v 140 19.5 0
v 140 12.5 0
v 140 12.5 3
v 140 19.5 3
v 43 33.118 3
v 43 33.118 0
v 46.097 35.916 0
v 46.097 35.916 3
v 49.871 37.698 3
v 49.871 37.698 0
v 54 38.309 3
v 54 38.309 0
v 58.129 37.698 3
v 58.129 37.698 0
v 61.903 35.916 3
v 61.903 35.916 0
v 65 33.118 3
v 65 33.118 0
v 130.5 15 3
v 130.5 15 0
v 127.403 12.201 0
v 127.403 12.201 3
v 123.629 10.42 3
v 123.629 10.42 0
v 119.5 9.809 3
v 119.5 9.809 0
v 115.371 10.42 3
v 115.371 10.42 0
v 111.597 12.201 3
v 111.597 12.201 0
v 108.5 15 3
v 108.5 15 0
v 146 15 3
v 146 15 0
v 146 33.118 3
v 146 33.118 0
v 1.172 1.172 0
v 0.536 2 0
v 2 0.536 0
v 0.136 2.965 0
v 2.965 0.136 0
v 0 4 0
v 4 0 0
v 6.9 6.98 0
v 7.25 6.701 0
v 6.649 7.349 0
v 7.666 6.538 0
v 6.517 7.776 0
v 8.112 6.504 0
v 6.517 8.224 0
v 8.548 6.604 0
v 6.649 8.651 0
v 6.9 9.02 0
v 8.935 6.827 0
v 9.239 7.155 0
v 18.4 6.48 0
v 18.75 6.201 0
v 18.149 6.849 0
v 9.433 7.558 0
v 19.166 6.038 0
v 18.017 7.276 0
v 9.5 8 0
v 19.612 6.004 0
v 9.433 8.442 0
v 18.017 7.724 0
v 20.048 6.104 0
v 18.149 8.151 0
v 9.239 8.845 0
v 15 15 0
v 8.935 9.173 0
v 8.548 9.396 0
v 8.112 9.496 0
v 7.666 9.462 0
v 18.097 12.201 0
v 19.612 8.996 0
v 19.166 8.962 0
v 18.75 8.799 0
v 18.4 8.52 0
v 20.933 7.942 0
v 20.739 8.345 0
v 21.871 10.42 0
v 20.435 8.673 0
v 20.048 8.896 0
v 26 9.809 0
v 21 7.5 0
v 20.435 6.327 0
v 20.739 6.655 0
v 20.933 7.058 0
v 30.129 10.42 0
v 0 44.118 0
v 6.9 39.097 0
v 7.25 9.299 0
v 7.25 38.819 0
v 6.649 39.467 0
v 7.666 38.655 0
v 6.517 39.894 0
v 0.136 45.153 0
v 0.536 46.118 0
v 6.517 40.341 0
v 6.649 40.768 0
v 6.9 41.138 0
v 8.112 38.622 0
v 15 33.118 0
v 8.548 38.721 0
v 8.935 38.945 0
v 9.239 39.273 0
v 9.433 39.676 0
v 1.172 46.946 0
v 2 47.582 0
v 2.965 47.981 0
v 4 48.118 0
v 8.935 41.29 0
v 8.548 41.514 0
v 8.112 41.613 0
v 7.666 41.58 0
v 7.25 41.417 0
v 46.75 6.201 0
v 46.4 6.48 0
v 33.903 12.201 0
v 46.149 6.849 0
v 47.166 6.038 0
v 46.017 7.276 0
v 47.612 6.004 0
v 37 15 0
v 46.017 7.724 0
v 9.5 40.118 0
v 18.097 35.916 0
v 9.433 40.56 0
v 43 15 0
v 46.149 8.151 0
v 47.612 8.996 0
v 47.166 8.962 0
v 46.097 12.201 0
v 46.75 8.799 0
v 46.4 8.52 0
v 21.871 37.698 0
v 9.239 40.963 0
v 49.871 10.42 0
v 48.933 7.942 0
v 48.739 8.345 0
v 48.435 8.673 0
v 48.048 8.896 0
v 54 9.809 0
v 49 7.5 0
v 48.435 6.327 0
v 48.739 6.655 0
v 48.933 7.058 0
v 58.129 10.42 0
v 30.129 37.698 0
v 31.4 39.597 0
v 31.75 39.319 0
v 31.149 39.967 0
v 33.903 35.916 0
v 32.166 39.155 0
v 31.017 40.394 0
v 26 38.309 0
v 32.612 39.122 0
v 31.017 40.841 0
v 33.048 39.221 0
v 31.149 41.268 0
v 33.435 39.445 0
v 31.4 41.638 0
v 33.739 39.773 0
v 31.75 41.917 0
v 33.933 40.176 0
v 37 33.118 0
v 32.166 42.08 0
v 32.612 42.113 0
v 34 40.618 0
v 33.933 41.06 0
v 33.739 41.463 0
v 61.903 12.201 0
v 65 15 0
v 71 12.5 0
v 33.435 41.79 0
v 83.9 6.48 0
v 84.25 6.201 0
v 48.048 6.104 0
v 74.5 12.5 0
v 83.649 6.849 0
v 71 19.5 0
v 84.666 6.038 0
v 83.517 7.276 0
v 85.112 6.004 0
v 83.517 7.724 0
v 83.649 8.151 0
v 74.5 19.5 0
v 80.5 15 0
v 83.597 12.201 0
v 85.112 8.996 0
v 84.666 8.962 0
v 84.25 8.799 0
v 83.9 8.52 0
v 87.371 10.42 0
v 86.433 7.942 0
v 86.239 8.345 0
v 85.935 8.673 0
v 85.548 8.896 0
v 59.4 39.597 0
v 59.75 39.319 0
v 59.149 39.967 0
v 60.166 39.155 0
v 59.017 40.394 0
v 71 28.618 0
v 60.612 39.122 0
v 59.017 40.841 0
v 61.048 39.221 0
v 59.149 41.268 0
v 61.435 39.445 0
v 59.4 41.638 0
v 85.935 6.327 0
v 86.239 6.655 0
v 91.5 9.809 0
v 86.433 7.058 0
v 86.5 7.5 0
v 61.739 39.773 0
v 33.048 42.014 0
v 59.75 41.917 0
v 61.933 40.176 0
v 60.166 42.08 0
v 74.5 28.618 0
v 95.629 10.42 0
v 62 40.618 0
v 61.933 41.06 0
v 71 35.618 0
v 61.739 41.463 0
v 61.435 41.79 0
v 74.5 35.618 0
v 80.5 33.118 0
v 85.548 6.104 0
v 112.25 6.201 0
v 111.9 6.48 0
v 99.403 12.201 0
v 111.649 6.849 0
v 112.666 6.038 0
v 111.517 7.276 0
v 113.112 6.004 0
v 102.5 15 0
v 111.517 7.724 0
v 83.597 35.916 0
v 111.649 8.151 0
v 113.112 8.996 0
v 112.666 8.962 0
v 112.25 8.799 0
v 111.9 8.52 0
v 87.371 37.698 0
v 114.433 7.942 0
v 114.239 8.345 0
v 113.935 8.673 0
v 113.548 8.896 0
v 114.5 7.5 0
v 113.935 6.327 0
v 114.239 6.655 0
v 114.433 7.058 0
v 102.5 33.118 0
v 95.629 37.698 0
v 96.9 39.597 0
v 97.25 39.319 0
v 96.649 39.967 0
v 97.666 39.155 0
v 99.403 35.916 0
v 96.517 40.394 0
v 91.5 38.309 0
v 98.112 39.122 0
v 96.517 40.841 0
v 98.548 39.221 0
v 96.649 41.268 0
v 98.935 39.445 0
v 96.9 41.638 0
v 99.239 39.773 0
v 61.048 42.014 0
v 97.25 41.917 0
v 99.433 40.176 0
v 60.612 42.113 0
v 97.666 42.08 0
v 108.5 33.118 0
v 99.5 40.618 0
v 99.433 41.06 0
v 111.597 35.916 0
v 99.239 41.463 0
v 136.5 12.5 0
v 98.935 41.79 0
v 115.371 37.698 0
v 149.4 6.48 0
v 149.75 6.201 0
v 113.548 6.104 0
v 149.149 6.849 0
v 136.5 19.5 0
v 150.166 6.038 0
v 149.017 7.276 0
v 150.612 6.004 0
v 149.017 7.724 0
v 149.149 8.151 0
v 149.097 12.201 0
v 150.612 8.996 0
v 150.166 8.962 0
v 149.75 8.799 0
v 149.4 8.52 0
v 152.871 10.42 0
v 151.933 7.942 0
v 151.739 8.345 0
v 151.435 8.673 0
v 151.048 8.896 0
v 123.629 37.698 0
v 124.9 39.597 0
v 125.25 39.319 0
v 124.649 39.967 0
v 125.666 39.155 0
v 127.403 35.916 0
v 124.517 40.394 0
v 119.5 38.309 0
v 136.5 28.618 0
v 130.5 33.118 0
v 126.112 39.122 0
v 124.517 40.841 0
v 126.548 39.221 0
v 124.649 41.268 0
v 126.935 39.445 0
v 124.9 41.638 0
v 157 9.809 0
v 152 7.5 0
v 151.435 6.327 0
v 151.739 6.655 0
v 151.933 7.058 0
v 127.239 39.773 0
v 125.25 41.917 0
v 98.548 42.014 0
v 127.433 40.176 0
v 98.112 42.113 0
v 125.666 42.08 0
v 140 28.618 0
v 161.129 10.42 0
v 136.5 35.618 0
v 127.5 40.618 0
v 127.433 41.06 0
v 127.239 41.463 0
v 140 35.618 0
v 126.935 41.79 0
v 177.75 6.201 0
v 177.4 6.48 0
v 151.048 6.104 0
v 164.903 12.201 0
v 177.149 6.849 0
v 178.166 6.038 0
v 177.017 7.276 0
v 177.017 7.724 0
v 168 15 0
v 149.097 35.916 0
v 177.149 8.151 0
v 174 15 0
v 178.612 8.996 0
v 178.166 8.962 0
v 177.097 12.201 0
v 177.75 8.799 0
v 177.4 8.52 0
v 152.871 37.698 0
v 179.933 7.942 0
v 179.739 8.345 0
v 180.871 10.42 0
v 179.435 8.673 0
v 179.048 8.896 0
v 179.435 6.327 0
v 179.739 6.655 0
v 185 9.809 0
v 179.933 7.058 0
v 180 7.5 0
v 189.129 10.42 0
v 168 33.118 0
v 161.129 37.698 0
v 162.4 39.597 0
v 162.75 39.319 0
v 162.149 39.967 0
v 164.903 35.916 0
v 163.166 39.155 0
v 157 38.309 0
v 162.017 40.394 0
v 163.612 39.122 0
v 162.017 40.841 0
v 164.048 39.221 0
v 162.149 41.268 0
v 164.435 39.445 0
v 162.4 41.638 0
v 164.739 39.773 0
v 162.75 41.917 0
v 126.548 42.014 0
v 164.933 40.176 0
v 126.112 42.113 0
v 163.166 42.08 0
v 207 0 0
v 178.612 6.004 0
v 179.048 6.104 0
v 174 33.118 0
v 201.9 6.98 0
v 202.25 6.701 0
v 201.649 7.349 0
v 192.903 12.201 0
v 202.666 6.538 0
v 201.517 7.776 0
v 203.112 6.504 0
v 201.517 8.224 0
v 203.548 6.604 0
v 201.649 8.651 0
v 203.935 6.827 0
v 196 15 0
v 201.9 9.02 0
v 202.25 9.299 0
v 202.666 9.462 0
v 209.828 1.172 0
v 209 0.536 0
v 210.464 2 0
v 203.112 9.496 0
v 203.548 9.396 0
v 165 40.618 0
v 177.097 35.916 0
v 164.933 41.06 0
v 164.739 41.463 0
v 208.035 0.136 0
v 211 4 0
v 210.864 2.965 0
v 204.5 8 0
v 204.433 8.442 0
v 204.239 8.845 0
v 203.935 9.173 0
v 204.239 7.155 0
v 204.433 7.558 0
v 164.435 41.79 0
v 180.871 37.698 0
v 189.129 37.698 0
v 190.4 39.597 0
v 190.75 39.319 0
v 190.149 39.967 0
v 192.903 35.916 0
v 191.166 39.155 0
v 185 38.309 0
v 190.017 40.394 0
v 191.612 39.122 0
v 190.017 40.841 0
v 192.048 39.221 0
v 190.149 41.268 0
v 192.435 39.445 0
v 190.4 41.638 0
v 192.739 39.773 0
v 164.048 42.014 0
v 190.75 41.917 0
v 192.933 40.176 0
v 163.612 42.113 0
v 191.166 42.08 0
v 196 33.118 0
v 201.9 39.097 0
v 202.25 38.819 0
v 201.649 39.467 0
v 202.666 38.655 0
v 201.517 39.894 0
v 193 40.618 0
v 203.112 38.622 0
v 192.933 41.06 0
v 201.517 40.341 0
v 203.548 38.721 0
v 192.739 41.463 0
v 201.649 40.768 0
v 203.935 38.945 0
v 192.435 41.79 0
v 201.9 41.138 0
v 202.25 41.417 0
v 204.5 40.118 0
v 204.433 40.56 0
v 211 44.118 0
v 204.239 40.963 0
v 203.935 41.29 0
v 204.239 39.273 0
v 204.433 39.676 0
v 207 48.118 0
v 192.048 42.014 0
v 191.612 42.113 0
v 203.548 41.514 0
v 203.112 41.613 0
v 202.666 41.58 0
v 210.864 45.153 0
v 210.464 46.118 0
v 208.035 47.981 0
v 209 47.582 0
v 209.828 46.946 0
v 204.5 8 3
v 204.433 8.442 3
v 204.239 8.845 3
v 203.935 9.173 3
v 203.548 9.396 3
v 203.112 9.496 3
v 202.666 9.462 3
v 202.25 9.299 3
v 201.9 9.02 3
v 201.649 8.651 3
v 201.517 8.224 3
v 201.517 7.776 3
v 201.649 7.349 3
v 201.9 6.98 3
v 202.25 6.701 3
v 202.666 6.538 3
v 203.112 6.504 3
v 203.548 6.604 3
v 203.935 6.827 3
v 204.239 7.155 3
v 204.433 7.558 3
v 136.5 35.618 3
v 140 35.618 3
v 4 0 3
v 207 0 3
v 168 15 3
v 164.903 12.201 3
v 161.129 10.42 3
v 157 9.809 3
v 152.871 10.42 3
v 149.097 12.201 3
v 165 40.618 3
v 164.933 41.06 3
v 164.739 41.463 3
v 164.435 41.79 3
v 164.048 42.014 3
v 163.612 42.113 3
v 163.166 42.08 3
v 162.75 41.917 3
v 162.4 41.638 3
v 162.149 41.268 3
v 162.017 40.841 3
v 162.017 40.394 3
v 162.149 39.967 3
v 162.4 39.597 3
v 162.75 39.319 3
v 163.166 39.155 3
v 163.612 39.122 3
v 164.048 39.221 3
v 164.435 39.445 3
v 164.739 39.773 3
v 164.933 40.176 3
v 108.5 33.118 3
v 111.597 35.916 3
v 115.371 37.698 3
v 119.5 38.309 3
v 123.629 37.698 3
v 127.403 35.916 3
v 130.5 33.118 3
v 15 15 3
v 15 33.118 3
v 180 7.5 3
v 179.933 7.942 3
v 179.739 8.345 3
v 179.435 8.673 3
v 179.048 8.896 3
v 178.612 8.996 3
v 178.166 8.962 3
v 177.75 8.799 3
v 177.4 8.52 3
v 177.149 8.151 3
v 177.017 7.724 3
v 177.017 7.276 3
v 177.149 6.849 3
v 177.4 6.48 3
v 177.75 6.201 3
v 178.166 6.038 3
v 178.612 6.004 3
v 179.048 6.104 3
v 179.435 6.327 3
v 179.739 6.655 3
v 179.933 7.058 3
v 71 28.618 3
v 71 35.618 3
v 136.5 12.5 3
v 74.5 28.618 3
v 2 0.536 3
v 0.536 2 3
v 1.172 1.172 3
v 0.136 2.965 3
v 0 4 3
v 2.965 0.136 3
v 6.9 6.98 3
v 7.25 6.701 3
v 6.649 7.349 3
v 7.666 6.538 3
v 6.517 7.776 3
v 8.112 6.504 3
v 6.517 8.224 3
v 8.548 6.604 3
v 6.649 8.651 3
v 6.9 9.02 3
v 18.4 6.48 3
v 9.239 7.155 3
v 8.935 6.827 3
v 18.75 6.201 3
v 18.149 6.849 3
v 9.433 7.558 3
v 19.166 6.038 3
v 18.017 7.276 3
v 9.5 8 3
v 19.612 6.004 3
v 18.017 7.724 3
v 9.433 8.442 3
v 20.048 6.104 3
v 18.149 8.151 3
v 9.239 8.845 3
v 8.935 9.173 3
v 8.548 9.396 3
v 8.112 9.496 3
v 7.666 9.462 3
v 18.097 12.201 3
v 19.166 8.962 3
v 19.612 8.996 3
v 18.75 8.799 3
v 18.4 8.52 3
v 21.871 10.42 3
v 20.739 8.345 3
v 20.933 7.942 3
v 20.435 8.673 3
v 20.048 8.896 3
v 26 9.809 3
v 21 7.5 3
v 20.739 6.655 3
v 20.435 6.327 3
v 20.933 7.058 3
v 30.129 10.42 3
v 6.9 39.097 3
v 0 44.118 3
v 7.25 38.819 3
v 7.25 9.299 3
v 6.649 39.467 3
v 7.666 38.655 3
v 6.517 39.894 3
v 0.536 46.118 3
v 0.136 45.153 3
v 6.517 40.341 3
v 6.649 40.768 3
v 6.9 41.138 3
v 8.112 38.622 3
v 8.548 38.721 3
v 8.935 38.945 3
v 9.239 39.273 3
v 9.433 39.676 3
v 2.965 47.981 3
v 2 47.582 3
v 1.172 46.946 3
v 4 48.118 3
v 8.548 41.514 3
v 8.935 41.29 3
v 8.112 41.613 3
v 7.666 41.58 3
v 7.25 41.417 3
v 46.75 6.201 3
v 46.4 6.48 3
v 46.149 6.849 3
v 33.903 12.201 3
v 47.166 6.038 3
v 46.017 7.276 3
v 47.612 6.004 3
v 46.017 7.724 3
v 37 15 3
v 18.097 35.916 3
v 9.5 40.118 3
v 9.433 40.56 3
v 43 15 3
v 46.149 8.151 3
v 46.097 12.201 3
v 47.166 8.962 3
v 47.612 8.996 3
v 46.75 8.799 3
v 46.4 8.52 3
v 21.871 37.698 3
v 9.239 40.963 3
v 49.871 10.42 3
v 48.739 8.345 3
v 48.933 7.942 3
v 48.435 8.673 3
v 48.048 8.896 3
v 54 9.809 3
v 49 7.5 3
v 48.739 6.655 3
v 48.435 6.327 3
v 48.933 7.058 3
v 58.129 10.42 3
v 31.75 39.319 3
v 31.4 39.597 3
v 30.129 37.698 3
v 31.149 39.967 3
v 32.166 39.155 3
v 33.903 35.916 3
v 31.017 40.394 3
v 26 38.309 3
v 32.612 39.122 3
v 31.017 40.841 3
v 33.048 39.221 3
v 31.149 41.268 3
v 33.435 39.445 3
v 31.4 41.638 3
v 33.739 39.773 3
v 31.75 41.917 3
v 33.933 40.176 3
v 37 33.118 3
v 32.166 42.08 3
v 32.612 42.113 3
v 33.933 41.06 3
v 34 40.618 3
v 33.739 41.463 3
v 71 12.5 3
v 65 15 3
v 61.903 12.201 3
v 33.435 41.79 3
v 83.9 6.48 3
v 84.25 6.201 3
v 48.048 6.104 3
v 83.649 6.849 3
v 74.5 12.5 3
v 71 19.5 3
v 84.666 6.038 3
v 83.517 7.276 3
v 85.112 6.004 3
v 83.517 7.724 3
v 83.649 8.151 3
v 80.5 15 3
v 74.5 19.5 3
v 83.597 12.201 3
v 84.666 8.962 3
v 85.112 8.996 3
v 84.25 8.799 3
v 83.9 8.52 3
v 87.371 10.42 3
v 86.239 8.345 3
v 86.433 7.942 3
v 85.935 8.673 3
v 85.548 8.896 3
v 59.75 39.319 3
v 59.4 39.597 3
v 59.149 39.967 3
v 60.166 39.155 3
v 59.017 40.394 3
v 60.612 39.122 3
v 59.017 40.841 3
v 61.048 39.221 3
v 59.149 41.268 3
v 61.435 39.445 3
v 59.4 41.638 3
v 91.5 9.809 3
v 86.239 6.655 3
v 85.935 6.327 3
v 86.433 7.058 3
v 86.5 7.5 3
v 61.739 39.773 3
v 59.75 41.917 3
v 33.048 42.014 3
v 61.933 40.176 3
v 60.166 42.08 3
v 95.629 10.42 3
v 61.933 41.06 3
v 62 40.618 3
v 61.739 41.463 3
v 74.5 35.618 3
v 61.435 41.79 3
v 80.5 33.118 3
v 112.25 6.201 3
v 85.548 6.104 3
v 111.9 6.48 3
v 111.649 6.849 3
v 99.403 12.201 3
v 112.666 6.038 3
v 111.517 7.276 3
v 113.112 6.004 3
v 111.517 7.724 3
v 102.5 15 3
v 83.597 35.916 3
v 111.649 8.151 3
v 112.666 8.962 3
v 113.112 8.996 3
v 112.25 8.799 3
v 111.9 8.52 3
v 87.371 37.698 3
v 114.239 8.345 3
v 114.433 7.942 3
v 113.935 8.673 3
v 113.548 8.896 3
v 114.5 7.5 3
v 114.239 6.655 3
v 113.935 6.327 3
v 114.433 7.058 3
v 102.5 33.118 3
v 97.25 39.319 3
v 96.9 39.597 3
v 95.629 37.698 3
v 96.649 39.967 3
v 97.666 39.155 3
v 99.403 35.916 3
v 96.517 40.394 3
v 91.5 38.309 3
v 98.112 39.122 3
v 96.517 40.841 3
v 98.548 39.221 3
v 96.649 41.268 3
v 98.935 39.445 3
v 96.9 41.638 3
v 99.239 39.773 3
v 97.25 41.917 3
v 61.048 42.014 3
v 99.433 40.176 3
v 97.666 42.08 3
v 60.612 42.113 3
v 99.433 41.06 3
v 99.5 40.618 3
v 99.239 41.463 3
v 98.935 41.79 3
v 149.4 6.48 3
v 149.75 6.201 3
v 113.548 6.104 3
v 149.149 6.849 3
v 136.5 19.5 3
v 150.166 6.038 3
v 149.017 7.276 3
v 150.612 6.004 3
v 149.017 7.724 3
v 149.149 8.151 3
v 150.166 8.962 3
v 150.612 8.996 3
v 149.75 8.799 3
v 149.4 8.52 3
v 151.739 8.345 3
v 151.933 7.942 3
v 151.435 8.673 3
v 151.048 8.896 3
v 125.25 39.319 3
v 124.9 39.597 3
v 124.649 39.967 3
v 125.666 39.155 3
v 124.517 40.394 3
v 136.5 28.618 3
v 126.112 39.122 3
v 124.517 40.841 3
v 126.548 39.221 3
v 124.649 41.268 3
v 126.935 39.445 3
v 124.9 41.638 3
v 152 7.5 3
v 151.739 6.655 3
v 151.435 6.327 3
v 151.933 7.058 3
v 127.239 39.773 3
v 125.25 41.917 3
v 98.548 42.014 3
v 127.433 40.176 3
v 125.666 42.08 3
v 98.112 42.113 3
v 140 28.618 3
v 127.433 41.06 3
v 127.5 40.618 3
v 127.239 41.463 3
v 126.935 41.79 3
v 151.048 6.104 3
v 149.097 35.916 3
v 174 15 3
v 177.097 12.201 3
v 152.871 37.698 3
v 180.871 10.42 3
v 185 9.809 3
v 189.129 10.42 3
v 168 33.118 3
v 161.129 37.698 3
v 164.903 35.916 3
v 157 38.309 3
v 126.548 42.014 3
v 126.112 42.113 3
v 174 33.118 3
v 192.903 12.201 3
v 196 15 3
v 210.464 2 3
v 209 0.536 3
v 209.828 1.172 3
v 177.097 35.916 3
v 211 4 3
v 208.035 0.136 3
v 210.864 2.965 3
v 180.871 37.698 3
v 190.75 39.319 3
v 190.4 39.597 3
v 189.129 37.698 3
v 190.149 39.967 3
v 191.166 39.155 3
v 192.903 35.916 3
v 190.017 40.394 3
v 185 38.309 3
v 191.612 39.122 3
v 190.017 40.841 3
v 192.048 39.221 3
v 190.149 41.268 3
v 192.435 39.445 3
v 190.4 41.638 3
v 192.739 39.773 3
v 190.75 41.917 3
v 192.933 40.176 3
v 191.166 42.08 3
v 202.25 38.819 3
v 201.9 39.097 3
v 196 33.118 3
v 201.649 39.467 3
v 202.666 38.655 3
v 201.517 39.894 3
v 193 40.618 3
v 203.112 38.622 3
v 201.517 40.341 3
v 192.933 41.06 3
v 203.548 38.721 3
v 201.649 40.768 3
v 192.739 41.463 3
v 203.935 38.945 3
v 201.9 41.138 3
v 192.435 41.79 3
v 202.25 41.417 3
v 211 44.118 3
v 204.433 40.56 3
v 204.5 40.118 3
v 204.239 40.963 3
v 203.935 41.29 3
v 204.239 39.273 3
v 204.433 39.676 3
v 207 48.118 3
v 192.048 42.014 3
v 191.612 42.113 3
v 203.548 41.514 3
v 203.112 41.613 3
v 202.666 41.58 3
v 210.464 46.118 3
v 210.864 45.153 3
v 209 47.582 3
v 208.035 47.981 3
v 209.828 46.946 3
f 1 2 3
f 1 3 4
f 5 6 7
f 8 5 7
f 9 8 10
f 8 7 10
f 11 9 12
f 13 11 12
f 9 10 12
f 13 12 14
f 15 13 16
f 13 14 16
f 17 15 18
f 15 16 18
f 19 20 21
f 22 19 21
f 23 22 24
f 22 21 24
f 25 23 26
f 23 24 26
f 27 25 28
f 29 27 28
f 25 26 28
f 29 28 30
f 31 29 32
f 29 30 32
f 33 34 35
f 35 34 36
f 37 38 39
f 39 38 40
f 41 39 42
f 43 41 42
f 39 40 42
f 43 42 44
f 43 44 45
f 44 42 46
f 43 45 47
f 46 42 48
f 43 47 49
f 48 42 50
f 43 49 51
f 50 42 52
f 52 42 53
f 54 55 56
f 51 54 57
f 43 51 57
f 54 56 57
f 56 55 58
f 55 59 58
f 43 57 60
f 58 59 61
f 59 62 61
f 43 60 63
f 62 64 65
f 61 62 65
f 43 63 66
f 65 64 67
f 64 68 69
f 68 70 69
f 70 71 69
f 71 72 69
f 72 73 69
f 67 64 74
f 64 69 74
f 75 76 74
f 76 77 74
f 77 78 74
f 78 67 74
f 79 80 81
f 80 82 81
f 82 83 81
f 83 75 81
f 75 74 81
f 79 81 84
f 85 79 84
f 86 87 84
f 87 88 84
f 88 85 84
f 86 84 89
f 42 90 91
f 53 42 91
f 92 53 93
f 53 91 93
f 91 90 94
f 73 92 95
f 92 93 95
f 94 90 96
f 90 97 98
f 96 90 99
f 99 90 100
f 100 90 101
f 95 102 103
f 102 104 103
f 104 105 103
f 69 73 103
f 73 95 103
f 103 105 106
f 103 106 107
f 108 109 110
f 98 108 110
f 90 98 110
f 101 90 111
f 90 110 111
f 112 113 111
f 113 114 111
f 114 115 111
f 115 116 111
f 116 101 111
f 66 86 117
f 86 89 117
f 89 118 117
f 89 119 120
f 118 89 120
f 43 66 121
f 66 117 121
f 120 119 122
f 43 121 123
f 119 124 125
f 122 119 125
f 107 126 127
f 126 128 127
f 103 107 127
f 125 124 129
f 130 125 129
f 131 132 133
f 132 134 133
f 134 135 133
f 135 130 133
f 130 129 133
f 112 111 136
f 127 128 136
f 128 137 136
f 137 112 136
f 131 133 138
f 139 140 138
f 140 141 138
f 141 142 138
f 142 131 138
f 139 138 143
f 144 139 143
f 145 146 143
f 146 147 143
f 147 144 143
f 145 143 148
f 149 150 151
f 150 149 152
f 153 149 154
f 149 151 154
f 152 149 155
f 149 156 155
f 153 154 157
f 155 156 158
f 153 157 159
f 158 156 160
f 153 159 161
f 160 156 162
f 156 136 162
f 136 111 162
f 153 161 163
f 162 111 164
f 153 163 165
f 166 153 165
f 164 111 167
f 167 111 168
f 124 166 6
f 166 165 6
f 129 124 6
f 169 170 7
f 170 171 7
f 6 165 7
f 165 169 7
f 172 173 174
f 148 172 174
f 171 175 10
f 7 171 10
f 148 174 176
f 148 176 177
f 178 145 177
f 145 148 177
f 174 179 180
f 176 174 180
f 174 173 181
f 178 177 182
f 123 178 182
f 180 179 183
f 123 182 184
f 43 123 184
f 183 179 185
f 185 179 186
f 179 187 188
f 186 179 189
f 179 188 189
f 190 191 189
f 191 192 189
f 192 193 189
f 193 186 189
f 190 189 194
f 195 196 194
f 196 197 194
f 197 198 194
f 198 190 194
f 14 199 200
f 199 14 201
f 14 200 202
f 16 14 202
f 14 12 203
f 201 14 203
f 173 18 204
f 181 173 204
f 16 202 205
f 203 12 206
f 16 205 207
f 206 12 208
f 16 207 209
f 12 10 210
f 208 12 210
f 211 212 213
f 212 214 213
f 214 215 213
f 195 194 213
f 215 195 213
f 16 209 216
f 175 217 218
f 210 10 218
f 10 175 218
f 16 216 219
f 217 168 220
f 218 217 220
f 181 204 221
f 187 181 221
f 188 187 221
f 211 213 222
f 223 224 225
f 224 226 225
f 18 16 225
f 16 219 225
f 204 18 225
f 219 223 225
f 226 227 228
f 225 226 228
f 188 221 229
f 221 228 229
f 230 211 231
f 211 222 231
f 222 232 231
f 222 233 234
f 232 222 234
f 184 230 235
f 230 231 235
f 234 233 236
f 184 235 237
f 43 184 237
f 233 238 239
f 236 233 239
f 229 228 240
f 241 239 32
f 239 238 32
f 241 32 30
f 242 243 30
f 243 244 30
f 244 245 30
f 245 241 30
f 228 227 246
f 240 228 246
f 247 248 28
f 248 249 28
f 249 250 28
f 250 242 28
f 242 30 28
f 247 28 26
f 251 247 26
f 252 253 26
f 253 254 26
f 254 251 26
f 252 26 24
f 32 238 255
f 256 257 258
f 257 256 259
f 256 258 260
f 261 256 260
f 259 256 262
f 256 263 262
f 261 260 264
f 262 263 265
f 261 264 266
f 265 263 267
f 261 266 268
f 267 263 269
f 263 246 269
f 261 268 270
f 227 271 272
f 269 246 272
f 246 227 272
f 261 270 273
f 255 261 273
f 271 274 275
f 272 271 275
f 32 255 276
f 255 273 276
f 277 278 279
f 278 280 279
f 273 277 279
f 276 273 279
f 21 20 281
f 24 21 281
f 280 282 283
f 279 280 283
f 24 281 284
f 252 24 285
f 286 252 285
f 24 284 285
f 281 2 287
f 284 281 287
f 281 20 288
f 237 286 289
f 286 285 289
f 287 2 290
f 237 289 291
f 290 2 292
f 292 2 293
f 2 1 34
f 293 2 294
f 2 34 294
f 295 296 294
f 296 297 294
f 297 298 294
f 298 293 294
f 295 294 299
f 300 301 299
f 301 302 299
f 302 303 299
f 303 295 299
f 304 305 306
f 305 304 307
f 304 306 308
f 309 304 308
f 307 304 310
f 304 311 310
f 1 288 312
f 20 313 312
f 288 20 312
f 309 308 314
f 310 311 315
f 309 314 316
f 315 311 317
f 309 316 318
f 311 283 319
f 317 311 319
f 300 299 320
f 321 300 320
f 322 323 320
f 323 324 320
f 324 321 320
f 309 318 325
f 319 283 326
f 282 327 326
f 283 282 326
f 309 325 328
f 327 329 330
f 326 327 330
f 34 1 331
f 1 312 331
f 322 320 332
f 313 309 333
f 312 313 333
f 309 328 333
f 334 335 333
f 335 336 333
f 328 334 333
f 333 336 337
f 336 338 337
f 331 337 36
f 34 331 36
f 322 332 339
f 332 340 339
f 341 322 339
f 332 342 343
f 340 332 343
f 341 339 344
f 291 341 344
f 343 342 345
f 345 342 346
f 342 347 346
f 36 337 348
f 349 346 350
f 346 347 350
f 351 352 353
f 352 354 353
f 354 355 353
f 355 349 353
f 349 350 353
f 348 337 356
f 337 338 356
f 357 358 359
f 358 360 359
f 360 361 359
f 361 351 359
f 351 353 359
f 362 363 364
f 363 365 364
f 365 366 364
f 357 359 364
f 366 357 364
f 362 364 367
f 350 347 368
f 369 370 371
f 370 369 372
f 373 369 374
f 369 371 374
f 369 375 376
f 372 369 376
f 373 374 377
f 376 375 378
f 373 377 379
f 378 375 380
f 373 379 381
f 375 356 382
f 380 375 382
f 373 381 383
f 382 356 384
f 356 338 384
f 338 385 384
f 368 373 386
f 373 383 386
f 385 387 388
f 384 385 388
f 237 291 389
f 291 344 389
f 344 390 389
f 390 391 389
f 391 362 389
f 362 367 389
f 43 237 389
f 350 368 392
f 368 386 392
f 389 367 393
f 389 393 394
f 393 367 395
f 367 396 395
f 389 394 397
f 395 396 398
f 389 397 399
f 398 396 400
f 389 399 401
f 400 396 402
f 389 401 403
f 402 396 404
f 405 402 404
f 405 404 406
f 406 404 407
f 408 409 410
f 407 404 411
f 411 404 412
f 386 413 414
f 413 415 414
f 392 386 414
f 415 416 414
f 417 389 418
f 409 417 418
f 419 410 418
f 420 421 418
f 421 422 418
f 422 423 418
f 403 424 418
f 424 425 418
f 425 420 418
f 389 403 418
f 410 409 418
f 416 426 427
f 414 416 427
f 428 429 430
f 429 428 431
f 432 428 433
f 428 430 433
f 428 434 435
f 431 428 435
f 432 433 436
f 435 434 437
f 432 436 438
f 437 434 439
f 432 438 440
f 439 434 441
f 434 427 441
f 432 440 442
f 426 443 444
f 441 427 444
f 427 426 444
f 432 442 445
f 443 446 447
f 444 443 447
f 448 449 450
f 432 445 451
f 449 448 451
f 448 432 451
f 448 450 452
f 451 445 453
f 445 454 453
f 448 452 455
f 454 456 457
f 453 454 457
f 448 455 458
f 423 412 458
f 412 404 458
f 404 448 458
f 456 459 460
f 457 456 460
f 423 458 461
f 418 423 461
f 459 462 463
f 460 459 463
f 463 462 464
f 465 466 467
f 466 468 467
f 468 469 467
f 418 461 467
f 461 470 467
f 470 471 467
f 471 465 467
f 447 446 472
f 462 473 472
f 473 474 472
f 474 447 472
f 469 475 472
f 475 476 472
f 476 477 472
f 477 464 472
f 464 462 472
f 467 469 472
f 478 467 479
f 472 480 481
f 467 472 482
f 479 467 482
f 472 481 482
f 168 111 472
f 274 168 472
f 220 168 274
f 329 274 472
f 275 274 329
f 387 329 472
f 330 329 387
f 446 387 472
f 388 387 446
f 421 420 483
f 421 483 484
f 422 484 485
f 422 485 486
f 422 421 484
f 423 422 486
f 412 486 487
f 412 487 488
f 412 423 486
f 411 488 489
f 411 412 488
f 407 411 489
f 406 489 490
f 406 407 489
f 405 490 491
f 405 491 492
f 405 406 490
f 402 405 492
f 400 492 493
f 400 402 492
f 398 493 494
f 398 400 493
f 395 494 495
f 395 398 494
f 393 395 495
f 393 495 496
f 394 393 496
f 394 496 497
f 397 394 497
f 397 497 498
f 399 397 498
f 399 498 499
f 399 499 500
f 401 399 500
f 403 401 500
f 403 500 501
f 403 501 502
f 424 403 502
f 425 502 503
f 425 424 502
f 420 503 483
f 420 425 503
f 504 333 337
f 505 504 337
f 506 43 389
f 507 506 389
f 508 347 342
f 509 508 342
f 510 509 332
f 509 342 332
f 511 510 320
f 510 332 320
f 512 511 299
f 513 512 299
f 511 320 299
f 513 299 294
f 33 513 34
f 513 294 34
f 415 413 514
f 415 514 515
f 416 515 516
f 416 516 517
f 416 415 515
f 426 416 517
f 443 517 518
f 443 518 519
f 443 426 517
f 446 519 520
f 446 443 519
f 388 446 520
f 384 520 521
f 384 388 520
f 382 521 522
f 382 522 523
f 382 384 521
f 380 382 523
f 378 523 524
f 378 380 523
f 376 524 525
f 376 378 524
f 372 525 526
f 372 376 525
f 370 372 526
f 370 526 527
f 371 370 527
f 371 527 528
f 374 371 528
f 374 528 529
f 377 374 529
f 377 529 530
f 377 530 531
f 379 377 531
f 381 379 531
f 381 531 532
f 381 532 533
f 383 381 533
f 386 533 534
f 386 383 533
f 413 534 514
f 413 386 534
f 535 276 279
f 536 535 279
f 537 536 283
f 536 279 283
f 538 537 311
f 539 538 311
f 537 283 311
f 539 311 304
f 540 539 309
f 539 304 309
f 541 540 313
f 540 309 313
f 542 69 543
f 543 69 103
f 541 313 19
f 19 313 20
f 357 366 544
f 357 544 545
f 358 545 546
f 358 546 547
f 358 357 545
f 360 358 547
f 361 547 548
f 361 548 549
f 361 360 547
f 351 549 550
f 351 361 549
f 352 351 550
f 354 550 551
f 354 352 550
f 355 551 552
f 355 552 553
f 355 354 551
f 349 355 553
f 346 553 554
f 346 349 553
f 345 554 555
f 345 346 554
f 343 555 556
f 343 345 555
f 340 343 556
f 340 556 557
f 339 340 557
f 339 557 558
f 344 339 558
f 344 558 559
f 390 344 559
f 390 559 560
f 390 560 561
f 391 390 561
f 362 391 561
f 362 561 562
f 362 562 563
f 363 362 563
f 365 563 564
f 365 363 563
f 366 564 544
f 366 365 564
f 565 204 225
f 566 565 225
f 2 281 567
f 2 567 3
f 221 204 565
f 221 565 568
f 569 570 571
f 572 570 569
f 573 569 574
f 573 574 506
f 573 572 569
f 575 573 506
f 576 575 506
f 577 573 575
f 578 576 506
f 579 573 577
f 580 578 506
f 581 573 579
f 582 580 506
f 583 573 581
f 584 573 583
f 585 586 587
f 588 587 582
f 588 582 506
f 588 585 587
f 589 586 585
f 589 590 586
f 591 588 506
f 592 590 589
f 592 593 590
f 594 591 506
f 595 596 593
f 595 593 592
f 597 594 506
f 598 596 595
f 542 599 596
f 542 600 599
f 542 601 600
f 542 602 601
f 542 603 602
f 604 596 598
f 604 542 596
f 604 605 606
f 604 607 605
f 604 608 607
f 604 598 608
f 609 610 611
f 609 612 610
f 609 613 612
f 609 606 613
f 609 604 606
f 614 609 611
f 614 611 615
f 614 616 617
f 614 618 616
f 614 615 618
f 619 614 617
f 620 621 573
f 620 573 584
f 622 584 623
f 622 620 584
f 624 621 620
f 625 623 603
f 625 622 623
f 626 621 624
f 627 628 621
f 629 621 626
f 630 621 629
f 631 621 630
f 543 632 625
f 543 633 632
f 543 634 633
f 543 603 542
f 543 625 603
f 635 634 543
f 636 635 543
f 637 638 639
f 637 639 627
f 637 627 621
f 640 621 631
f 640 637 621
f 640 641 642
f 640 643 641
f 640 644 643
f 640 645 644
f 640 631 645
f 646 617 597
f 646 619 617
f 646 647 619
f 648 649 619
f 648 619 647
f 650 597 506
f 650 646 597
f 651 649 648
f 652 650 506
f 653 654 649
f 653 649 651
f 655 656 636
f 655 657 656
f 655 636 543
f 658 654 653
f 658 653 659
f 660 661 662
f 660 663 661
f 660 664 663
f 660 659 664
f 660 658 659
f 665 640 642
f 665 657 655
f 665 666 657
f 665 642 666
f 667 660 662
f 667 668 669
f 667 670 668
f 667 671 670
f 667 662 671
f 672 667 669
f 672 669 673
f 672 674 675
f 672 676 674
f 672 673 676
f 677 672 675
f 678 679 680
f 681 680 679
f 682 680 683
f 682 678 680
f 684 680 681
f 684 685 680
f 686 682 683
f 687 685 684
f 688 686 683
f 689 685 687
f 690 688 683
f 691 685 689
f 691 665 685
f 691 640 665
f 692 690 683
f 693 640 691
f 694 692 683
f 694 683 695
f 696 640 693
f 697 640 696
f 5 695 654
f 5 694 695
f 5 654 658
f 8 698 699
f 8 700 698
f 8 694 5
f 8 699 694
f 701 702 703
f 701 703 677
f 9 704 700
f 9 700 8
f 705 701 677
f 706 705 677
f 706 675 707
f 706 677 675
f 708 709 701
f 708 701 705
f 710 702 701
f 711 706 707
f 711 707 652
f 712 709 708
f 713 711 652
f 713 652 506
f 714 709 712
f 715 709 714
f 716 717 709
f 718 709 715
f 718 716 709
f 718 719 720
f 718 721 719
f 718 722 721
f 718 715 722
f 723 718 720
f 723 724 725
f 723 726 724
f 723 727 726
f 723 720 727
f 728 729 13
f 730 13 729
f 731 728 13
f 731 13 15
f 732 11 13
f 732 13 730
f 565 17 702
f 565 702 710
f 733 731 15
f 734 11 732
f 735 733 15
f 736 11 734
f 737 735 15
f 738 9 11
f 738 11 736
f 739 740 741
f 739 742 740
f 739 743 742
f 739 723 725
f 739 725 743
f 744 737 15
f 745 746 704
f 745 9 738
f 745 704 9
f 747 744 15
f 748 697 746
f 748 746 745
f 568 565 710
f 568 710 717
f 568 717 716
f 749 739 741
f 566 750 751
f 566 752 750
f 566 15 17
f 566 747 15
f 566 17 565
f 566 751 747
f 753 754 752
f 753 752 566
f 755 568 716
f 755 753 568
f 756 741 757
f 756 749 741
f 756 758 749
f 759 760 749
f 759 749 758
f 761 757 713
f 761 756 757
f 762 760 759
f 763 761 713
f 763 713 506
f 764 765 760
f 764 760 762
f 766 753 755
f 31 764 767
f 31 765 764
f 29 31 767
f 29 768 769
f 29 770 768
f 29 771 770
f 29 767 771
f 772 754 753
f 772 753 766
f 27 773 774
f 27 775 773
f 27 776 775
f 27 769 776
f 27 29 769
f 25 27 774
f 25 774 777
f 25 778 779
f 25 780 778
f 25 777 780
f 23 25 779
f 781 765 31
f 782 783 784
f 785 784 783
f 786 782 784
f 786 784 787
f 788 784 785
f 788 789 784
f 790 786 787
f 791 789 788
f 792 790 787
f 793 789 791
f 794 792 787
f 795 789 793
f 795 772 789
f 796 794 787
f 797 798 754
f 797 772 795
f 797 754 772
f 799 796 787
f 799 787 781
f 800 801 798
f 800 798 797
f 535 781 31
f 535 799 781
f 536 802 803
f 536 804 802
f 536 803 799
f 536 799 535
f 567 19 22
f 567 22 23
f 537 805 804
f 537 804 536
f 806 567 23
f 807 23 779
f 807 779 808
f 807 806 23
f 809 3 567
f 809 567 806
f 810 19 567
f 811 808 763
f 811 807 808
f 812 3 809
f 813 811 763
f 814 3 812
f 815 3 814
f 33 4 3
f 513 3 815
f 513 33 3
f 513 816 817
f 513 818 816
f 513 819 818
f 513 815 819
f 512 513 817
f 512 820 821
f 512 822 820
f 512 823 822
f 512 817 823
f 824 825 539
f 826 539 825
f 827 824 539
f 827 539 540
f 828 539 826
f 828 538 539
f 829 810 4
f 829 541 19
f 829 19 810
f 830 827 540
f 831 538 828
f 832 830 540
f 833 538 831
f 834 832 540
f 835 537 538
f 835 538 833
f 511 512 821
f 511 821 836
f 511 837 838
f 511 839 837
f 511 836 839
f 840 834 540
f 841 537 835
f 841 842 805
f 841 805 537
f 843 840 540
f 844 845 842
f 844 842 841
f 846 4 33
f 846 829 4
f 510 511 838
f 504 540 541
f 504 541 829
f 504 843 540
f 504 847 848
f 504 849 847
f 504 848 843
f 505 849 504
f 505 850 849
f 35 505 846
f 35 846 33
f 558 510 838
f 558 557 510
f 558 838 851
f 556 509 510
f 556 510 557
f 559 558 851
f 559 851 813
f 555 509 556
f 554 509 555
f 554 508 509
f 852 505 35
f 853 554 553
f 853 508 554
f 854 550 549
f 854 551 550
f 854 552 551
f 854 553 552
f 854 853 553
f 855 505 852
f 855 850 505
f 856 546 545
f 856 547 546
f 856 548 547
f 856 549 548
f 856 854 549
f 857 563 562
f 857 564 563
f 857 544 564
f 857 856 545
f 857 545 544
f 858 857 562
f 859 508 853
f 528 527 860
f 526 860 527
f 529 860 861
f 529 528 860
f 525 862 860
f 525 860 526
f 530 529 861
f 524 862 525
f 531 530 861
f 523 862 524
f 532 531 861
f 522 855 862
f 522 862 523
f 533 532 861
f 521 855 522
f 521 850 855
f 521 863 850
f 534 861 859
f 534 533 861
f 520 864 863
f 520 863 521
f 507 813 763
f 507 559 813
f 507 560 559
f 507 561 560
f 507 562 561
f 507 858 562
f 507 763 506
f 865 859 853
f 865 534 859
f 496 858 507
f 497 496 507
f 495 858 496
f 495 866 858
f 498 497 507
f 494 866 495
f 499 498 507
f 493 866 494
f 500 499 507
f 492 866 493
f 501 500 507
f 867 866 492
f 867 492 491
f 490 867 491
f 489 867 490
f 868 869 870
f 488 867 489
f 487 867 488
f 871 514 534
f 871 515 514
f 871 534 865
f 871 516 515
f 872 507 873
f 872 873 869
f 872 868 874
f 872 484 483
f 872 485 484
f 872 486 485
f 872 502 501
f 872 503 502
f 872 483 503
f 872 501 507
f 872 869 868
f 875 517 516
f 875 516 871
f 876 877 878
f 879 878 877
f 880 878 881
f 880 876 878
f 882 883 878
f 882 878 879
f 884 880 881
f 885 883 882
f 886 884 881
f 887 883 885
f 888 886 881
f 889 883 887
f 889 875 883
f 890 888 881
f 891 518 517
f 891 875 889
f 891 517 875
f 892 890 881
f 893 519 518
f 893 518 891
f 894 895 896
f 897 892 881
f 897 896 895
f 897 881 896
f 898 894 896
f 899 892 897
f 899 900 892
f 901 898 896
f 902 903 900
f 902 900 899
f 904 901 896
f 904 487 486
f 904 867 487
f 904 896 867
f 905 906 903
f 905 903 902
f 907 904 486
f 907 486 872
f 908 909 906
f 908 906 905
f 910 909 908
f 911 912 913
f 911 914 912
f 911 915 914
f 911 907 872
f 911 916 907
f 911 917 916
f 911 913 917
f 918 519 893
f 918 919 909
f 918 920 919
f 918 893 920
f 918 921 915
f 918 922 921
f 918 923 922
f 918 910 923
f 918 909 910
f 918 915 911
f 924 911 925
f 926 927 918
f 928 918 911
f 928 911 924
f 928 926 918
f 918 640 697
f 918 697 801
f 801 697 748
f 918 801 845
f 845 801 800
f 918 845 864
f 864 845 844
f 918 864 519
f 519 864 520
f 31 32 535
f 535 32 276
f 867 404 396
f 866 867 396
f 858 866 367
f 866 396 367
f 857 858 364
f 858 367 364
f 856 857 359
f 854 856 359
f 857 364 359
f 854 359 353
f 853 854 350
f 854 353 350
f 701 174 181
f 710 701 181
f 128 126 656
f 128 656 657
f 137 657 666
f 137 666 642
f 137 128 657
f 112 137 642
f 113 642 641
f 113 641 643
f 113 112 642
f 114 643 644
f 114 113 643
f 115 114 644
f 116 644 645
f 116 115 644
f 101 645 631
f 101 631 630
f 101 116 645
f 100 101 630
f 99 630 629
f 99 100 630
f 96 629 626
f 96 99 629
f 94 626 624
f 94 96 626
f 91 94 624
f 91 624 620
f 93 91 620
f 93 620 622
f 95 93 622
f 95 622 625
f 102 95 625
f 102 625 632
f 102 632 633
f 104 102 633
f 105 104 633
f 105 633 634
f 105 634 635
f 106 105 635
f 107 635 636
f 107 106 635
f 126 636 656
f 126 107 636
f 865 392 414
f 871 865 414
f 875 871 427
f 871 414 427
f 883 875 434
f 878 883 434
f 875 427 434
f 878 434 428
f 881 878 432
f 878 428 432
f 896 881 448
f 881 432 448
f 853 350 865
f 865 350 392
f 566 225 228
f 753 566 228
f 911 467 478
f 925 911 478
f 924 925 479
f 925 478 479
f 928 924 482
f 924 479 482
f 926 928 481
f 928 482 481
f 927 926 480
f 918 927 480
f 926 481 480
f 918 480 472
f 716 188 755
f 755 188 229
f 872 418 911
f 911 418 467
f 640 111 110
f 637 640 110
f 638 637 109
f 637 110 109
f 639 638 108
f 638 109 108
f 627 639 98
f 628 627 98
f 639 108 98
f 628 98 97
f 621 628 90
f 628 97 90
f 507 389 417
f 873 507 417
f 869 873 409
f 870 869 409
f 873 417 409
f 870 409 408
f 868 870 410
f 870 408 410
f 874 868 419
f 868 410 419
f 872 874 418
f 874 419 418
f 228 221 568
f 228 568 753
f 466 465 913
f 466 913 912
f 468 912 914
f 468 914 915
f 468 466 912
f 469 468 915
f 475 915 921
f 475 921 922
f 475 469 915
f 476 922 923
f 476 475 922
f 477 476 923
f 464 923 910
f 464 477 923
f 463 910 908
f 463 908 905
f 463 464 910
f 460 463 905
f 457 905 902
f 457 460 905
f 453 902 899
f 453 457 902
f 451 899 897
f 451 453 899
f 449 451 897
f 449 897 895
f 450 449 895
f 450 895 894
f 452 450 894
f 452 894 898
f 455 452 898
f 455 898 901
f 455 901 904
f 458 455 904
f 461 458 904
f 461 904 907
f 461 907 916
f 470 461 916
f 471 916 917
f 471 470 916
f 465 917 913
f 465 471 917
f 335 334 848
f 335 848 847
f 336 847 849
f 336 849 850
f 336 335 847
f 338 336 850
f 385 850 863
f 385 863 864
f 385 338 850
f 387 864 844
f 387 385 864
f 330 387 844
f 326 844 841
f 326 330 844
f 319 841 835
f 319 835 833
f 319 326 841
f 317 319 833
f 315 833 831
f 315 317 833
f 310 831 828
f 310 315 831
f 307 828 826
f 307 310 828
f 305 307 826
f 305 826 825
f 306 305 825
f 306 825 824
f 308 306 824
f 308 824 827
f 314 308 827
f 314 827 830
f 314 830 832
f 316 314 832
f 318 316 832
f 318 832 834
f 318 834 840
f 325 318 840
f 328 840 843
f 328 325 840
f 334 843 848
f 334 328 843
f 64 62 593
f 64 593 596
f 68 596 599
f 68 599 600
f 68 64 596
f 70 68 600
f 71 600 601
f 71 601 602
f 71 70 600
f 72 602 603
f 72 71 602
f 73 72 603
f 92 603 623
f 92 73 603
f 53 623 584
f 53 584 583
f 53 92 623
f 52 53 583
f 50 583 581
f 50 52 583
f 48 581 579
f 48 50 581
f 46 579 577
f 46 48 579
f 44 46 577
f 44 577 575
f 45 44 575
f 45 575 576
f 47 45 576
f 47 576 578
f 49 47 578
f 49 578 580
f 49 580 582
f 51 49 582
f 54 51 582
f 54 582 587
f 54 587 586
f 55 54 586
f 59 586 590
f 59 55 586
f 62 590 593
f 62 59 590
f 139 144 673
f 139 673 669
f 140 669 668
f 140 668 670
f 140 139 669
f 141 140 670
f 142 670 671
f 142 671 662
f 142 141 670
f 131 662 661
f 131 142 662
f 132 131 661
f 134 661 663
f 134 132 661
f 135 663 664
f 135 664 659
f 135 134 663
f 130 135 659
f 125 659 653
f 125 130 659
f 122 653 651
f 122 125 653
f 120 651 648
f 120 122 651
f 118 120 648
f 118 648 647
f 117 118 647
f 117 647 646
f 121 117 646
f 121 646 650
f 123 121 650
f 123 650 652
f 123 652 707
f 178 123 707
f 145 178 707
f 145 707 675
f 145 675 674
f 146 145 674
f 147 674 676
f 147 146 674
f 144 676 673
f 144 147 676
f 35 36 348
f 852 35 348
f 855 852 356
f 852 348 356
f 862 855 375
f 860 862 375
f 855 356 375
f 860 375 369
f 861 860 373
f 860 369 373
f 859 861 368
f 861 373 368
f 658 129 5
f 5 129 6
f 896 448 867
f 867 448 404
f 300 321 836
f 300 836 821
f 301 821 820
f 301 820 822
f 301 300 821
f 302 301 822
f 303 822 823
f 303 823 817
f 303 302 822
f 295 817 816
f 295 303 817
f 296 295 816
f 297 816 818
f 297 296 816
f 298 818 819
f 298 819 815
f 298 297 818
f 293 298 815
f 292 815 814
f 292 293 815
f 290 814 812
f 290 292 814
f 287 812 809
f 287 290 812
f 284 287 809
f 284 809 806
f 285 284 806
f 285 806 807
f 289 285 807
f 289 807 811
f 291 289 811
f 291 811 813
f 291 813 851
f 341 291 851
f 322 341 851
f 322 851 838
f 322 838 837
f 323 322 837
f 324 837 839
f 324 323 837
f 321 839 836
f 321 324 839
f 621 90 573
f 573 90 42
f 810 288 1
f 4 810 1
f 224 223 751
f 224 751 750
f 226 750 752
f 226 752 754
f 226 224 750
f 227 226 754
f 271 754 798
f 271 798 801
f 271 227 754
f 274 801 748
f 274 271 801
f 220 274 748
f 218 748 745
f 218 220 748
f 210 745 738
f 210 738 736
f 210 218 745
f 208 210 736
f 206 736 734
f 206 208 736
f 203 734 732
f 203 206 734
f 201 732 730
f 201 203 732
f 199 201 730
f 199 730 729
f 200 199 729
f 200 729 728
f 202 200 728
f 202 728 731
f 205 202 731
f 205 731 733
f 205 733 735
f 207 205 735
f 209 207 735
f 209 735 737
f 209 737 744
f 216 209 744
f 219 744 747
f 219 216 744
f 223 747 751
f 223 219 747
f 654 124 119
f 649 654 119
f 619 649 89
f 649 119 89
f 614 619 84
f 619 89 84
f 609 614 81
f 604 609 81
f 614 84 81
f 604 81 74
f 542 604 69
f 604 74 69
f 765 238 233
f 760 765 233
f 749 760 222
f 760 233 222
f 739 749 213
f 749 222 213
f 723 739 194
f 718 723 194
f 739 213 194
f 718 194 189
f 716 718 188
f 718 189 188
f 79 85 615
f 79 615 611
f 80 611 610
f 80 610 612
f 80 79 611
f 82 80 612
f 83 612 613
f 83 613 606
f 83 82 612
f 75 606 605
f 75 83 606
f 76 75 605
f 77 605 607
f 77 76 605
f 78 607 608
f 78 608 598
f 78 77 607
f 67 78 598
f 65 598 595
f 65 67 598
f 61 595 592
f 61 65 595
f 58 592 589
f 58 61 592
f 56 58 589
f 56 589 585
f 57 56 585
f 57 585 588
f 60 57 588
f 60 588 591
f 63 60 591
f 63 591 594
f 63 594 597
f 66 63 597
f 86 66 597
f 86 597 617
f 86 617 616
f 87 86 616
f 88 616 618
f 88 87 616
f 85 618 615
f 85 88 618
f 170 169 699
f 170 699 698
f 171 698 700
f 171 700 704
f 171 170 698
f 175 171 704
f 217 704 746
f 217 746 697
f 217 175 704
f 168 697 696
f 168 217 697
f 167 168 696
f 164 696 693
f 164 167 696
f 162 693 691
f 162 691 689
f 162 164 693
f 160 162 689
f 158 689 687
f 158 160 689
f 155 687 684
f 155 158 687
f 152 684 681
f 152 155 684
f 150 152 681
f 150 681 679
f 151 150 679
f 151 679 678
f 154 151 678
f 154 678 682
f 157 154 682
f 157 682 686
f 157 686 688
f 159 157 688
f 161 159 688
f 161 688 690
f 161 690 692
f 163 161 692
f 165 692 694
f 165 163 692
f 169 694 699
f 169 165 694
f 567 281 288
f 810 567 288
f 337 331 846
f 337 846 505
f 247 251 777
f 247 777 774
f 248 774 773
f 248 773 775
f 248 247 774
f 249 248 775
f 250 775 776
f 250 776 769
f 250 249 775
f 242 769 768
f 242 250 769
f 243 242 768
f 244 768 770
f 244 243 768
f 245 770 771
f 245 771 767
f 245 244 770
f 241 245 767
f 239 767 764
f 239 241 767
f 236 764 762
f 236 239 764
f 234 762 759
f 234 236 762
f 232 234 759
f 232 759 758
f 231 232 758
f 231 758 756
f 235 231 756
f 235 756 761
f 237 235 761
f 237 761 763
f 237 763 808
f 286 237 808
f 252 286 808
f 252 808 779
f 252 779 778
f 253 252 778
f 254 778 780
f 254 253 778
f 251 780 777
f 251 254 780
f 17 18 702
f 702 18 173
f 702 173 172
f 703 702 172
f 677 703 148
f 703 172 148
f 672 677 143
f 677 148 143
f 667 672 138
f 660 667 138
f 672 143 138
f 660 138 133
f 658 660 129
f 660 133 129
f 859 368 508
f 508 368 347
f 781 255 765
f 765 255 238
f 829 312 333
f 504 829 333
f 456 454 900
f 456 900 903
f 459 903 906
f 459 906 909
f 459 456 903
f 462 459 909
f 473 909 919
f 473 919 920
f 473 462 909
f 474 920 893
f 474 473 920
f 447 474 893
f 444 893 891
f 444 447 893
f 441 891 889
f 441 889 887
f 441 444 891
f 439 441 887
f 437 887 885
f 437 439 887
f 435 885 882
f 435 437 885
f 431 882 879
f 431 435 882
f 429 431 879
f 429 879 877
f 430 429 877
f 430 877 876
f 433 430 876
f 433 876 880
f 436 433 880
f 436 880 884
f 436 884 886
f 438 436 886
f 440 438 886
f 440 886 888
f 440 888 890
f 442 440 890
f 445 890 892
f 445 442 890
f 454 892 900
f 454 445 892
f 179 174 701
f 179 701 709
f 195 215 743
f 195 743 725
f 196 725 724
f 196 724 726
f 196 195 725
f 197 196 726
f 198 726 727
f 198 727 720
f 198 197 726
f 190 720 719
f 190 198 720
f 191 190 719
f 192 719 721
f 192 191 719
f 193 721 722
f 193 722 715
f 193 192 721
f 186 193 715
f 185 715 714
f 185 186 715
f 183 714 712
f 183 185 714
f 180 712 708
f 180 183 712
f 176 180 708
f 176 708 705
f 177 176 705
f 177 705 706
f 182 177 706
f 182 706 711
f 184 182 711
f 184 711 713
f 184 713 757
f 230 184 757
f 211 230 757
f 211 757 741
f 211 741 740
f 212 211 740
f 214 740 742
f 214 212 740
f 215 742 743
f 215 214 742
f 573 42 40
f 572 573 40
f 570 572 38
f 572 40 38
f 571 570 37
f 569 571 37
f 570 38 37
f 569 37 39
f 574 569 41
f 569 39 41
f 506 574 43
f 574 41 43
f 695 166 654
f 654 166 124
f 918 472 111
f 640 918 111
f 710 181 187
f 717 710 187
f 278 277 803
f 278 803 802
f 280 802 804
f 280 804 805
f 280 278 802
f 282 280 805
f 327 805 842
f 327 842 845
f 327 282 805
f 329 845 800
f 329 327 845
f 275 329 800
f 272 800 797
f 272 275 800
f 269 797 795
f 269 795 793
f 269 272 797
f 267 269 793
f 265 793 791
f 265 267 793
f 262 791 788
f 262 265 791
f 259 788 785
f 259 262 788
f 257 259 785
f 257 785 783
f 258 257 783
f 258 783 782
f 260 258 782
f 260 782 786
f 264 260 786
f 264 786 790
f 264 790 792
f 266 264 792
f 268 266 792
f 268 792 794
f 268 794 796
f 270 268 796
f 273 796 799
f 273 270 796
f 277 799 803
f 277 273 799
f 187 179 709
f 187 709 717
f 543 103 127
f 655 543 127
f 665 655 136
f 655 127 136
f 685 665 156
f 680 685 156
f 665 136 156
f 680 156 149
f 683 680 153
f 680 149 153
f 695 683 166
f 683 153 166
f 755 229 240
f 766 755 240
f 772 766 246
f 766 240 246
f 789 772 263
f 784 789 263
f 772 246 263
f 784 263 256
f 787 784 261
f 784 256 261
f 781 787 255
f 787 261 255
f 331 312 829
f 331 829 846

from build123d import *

# Parameters (mm, degrees)
SKETCH1_R           = 1.5
SKETCH1_W           = 3.5
SKETCH1_H           = 7
BOSS_EXTRUDE1_DEPTH = 3


with BuildPart() as part:
    # Sketch1 → Boss-Extrude1 (new body)
    with BuildSketch(Plane.XY):
        with BuildLine():
            Line((4, 0), (207, 0))
            ThreePointArc((207, 0), (209.828427125, 1.171572875), (211, 4))
            Line((211, 4), (211, 44.117670932))
            ThreePointArc((211, 44.117670932), (209.828427125, 46.946098057), (207, 48.117670932))
            Line((207, 48.117670932), (4, 48.117670932))
            ThreePointArc((4, 48.117670932), (1.171572875, 46.946098057), (0, 44.117670932))
            Line((0, 44.117670932), (0, 4))
            ThreePointArc((0, 4), (1.171572875, 1.171572875), (4, 0))
        make_face()
        with Locations((32.5, 40.617670932)):
            Circle(SKETCH1_R, mode=Mode.SUBTRACT)
        with Locations((19.5, 7.5)):
            Circle(SKETCH1_R, mode=Mode.SUBTRACT)
        with Locations((60.5, 40.617670932)):
            Circle(SKETCH1_R, mode=Mode.SUBTRACT)
        with Locations((47.5, 7.5)):
            Circle(SKETCH1_R, mode=Mode.SUBTRACT)
        with Locations((98, 40.617670932)):
            Circle(SKETCH1_R, mode=Mode.SUBTRACT)
        with Locations((85, 7.5)):
            Circle(SKETCH1_R, mode=Mode.SUBTRACT)
        with Locations((126, 40.617670932)):
            Circle(SKETCH1_R, mode=Mode.SUBTRACT)
        with Locations((113, 7.5)):
            Circle(SKETCH1_R, mode=Mode.SUBTRACT)
        with Locations((8, 40.117670932)):
            Circle(SKETCH1_R, mode=Mode.SUBTRACT)
        with Locations((8, 8)):
            Circle(SKETCH1_R, mode=Mode.SUBTRACT)
        with Locations((203, 8)):
            Circle(SKETCH1_R, mode=Mode.SUBTRACT)
        with Locations((203, 40.117670932)):
            Circle(SKETCH1_R, mode=Mode.SUBTRACT)
        with Locations((163.5, 40.617670932)):
            Circle(SKETCH1_R, mode=Mode.SUBTRACT)
        with Locations((150.5, 7.5)):
            Circle(SKETCH1_R, mode=Mode.SUBTRACT)
        with Locations((191.5, 40.617670932)):
            Circle(SKETCH1_R, mode=Mode.SUBTRACT)
        with Locations((178.5, 7.5)):
            Circle(SKETCH1_R, mode=Mode.SUBTRACT)
        with BuildLine():
            Line((15, 15), (15, 33.117670932))
            ThreePointArc((15, 33.117670932), (26, 38.308835466), (37, 33.117670932))
            Line((37, 33.117670932), (37, 15))
            ThreePointArc((37, 15), (26, 9.808835466), (15, 15))
        make_face(mode=Mode.SUBTRACT)
        with BuildLine():
            Line((43, 15), (43, 33.117670932))
            ThreePointArc((43, 33.117670932), (54, 38.308835466), (65, 33.117670932))
            Line((65, 33.117670932), (65, 15))
            ThreePointArc((65, 15), (54, 9.808835466), (43, 15))
        make_face(mode=Mode.SUBTRACT)
        with BuildLine():
            Line((80.5, 15), (80.5, 33.117670932))
            ThreePointArc((80.5, 33.117670932), (91.5, 38.308835466), (102.5, 33.117670932))
            Line((102.5, 33.117670932), (102.5, 15))
            ThreePointArc((102.5, 15), (91.5, 9.808835466), (80.5, 15))
        make_face(mode=Mode.SUBTRACT)
        with Locations((72.75, 32.117670932)):
            Rectangle(SKETCH1_W, SKETCH1_H, mode=Mode.SUBTRACT)
        with Locations((72.75, 16)):
            Rectangle(SKETCH1_W, SKETCH1_H, mode=Mode.SUBTRACT)
        with BuildLine():
            Line((108.5, 15), (108.5, 33.117670932))
            ThreePointArc((108.5, 33.117670932), (119.5, 38.308835466), (130.5, 33.117670932))
            Line((130.5, 33.117670932), (130.5, 15))
            ThreePointArc((130.5, 15), (119.5, 9.808835466), (108.5, 15))
        make_face(mode=Mode.SUBTRACT)
        with BuildLine():
            Line((146, 15), (146, 33.117670932))
            ThreePointArc((146, 33.117670932), (157, 38.308835466), (168, 33.117670932))
            Line((168, 33.117670932), (168, 15))
            ThreePointArc((168, 15), (157, 9.808835466), (146, 15))
        make_face(mode=Mode.SUBTRACT)
        with Locations((138.25, 32.117670932)):
            Rectangle(SKETCH1_W, SKETCH1_H, mode=Mode.SUBTRACT)
        with Locations((138.25, 16)):
            Rectangle(SKETCH1_W, SKETCH1_H, mode=Mode.SUBTRACT)
        with BuildLine():
            Line((174, 15), (174, 33.117670932))
            ThreePointArc((174, 33.117670932), (185, 38.308835466), (196, 33.117670932))
            Line((196, 33.117670932), (196, 15))
            ThreePointArc((196, 15), (185, 9.808835466), (174, 15))
        make_face(mode=Mode.SUBTRACT)
    extrude(amount=BOSS_EXTRUDE1_DEPTH)


solid = part.part
